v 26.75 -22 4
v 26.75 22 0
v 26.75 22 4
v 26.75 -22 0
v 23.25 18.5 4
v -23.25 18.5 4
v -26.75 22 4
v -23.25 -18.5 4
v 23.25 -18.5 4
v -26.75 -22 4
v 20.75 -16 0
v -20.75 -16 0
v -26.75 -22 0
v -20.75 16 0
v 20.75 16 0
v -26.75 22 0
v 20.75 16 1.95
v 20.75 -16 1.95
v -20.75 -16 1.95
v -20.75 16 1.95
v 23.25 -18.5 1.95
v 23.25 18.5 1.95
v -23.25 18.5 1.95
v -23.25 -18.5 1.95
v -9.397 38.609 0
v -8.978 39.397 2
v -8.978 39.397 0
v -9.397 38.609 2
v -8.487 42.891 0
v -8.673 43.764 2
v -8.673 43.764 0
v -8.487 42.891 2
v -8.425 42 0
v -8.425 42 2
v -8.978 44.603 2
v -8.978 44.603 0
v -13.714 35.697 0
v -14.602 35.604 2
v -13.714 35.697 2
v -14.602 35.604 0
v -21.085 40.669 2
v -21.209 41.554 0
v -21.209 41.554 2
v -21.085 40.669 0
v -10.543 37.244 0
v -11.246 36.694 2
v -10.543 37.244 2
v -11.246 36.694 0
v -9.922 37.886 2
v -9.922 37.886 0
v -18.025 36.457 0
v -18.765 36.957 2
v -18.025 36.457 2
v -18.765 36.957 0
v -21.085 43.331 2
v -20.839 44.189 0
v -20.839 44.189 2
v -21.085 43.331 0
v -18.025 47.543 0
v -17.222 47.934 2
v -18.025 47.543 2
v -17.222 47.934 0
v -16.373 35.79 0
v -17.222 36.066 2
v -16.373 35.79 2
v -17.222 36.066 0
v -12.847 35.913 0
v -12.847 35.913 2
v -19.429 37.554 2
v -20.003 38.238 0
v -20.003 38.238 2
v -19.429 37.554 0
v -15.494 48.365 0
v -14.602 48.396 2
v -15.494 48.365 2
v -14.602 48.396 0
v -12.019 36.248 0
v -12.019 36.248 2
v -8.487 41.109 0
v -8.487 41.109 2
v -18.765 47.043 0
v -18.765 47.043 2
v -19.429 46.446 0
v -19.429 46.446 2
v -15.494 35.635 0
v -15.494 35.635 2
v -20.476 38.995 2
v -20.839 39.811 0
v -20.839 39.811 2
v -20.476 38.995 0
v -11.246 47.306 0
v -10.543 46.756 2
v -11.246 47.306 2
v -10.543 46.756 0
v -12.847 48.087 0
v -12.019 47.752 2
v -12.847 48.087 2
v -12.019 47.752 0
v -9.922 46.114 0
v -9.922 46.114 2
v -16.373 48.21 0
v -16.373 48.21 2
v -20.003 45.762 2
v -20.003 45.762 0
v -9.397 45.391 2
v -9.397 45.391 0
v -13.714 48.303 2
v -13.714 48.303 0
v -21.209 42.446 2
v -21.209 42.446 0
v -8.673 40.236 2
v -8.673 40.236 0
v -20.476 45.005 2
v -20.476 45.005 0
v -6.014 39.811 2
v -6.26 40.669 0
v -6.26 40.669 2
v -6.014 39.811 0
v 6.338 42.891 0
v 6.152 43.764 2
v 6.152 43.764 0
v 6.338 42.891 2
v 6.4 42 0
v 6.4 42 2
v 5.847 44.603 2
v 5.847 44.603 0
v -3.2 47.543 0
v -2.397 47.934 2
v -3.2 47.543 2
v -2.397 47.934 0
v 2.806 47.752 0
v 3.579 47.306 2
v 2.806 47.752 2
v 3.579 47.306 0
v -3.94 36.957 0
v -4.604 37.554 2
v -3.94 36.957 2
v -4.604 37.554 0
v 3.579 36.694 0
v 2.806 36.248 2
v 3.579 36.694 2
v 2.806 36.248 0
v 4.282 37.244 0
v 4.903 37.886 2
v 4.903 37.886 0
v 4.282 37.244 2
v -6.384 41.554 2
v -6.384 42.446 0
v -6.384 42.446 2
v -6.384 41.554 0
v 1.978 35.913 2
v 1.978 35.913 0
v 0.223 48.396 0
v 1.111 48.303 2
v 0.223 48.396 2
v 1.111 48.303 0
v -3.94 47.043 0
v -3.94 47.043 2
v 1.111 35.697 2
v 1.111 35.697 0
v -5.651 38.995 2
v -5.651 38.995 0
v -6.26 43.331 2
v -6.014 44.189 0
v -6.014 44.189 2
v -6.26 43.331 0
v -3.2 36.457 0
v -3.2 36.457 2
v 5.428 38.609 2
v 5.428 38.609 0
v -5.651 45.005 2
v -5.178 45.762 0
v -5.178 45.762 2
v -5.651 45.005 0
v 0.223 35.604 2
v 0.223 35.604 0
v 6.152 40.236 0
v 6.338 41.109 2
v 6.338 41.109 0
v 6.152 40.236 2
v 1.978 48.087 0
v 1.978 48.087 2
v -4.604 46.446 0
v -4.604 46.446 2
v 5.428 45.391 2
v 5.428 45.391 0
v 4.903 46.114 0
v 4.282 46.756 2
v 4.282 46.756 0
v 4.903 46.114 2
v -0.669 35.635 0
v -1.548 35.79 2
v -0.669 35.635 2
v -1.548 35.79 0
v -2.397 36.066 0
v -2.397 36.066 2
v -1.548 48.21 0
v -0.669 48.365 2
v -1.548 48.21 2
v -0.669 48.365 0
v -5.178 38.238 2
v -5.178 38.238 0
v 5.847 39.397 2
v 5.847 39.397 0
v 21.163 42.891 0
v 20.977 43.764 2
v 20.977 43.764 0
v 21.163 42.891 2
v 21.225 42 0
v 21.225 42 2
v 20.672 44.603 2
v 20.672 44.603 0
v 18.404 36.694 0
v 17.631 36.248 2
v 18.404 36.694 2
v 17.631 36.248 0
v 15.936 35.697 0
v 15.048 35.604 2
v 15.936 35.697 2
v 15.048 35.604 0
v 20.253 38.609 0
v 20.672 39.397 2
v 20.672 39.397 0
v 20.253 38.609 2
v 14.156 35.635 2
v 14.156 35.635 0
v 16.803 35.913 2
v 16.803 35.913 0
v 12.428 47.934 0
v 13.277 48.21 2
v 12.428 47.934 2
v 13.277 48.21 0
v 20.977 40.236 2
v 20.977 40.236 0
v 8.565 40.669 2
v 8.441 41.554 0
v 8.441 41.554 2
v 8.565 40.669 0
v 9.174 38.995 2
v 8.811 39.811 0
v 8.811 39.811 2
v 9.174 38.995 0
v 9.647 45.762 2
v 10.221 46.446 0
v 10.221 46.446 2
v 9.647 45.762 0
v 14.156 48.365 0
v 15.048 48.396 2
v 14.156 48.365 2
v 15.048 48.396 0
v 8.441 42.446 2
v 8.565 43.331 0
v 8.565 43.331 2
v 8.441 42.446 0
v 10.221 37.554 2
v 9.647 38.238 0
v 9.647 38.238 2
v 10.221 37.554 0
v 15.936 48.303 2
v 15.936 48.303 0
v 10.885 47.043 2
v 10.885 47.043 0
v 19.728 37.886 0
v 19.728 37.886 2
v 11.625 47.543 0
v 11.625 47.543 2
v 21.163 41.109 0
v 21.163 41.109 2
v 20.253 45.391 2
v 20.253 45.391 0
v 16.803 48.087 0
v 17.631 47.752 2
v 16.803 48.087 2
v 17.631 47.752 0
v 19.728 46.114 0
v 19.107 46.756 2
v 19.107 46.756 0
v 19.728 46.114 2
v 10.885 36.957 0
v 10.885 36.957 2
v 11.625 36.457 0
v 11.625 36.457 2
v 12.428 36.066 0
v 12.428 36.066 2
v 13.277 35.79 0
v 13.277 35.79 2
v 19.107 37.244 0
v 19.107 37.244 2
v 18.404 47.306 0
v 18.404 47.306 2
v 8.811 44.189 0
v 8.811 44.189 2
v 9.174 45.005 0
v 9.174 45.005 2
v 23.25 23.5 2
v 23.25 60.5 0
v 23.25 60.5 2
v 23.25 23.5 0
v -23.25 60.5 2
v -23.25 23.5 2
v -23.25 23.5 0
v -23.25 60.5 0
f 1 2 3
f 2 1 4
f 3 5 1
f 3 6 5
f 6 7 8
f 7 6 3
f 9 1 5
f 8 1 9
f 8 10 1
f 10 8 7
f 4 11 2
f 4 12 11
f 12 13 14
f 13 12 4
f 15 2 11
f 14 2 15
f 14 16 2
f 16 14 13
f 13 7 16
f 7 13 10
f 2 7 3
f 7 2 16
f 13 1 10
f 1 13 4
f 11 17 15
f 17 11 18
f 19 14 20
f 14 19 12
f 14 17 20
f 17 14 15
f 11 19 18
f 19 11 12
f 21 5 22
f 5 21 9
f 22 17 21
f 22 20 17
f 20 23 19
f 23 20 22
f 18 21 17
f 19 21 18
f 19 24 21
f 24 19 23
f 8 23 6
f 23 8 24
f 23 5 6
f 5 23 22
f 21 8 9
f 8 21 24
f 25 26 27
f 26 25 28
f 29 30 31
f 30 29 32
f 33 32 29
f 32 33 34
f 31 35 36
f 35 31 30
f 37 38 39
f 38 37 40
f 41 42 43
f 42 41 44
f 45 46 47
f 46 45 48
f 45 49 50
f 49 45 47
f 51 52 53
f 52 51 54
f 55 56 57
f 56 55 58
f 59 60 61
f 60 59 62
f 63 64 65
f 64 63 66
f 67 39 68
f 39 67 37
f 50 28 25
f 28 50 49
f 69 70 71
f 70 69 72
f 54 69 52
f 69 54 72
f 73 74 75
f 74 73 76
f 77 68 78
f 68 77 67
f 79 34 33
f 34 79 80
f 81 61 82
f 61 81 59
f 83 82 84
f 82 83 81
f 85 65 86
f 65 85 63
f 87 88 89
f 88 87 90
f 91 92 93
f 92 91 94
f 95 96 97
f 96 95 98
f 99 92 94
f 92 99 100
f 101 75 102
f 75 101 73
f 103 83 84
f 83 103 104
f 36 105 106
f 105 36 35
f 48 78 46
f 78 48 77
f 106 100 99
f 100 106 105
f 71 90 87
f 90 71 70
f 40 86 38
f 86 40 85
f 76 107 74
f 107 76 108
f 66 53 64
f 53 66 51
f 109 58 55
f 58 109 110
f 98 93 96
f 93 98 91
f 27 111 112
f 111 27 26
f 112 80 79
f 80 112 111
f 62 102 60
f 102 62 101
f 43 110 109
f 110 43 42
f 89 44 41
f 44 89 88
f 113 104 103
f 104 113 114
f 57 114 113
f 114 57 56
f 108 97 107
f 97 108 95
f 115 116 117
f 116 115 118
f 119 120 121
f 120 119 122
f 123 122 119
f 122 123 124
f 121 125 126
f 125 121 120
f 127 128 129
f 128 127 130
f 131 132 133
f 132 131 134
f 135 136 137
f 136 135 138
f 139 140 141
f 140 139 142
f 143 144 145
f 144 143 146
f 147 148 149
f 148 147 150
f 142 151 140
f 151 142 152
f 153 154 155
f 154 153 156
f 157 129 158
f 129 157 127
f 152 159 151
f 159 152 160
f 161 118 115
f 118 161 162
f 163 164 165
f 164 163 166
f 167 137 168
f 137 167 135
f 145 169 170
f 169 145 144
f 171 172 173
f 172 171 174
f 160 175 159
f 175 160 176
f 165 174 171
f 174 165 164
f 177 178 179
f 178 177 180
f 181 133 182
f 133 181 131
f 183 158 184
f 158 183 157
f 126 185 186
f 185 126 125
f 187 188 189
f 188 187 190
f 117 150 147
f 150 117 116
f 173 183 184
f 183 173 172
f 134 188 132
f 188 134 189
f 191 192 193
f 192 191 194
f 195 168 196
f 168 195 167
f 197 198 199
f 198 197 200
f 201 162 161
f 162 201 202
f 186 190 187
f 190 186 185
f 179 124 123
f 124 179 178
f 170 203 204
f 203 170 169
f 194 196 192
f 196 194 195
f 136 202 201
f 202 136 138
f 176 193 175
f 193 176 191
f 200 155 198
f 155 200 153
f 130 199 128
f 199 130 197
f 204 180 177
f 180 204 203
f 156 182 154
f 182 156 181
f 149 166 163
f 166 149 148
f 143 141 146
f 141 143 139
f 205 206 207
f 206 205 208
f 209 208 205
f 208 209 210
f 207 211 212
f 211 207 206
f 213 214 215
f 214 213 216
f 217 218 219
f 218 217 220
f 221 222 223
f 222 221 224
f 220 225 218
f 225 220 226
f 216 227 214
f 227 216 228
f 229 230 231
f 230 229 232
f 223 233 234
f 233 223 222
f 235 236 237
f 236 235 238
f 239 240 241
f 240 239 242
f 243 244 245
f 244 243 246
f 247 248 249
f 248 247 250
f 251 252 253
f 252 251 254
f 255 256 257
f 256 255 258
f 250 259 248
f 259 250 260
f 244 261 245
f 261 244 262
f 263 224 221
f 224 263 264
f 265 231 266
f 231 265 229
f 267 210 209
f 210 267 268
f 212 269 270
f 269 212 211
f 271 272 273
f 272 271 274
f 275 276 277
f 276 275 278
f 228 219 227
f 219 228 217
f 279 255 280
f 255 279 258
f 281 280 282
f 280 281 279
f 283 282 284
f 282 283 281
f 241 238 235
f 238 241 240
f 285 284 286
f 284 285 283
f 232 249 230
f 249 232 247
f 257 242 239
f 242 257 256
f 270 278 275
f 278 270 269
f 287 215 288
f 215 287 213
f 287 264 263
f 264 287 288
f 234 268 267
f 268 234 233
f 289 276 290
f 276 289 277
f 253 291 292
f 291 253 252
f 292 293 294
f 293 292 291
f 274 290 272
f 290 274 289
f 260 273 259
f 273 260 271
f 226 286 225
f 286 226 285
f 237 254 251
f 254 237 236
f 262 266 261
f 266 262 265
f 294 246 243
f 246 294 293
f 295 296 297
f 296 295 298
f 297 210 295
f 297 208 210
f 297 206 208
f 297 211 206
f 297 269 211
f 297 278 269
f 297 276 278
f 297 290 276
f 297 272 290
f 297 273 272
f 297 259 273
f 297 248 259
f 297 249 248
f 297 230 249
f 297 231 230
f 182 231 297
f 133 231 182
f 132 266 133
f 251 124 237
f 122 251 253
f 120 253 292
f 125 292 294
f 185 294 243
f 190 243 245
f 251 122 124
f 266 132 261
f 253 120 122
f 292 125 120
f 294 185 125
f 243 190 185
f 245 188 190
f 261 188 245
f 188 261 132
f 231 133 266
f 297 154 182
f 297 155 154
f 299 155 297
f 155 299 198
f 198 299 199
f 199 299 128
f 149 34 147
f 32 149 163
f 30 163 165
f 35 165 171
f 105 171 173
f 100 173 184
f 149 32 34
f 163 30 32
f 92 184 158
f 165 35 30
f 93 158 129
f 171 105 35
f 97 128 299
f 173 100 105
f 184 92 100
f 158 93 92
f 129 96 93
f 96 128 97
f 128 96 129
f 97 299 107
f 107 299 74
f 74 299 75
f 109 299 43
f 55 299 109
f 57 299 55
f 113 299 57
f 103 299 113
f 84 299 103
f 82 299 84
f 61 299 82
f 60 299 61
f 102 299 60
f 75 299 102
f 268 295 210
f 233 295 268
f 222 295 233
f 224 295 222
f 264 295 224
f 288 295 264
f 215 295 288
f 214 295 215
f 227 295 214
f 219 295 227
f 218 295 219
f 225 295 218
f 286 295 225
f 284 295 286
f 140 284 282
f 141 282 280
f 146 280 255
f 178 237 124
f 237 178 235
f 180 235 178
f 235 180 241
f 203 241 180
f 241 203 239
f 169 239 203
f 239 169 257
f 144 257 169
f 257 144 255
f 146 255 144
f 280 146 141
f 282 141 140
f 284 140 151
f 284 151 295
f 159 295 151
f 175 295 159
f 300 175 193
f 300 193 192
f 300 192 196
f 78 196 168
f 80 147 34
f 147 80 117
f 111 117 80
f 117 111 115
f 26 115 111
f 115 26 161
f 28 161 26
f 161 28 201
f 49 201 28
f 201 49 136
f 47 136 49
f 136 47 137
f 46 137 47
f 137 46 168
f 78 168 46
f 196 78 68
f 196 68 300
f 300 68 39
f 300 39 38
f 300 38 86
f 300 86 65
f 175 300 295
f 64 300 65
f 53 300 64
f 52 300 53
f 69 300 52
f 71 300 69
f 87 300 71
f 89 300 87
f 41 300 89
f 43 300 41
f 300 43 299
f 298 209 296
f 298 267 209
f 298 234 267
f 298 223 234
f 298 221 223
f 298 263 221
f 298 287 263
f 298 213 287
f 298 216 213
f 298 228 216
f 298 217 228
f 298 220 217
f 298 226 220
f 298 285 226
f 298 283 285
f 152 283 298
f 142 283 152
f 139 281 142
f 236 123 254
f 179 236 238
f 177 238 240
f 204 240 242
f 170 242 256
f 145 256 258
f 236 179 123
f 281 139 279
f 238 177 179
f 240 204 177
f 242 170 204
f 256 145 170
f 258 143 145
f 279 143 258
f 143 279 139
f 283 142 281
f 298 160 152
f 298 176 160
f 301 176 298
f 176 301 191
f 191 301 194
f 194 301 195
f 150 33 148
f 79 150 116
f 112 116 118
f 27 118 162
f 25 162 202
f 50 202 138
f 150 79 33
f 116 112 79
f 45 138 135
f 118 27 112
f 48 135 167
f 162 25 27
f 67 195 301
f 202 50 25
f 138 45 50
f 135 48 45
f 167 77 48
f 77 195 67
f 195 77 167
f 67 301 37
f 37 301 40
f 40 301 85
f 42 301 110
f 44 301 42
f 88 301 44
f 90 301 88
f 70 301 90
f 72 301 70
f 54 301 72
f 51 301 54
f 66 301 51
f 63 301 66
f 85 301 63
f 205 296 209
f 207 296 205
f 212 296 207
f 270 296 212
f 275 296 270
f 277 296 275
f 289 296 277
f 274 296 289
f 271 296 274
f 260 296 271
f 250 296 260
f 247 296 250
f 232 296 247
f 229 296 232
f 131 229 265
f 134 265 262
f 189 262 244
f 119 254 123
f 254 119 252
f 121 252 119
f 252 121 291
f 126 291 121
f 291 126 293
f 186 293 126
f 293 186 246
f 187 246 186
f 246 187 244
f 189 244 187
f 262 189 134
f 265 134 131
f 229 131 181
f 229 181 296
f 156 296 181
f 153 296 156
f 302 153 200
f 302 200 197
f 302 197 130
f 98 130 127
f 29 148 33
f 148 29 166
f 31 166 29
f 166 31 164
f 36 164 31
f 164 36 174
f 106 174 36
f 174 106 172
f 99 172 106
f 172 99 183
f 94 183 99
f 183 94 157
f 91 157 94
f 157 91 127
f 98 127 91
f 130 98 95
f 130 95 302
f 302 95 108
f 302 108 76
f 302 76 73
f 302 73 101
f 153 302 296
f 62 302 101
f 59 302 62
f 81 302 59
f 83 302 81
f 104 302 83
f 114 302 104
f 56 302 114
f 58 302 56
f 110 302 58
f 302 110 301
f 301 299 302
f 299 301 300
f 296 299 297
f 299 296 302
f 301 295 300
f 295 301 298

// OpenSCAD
// Title: Picture Frame
// Author: http://www.thingiverse.com/Jinja
// Date: 28/9/2013

/////////// START OF PARAMETERS /////////////////

// The height of the picture
height = 45.5;

// The width of the picture
width = 36;

// The width of the frame border
border = 6;

// How much the border overlaps the edge of the picture
overlap = 2;

// How thick the frame is in total
thickness = 4;

// How thick the backing is
back_thickness = 2;

// The diameter of the magnet holes, 0 if you don't want holes. Even if you're not adding magnets, adding holes uses less plastic.
magnet_diameter = 12.8;

// whether or not to include a stand
stand = "NoStand"; //[ Stand, NoStand ]

// calibration, how many 10ths of a millimeter to adjust the backing size so it is a snug fit in the frame. Increase if it's too loose, decrease if it's too tight. Once you've found the right value for your printer you should be able to print frames of any size. Experiment with small frames first.
calibration = 0; //[-10:10]

// What to include on the plate
plate = "Both"; //[ Back, Front, Both ]


/////////// END OF PARAMETERS /////////////////
rounded = 0.7*1;
overhang=45*1;

adjust = calibration/10;

$fs=0.3*1;
//$fa=5*1; //smooth
$fa=8*1; //nearly smooth
//$fa=20*1; //rough


if( ( plate == "Front" ) || ( plate == "Both" ) )
{
	front( height, width, border, overlap, thickness, back_thickness, stand );
}

if( ( plate == "Back" ) || ( plate == "Both" ) )
{
	translate([0, width+border ,back_thickness*0.5])
	back( height+adjust+1, width+adjust+1, back_thickness, magnet_diameter);
}

module front( height, width, border, overlap, thickness, back_thickness, stand )
{
	difference()
	{
		translate([0,0,thickness*0.5])
		frame( height, width, border, overlap, thickness );
		translate([0,0,thickness-(0.5*back_thickness)])
		back( height+1, width+1, back_thickness*1.05 );
	}
	y = (height*0.7)*cos(75);
	x = y*cos(75);
	s = border-overlap-0.5;
	if( stand=="Stand" )
	{
		translate([height*0.5+s+0.5,0,thickness])
		hull()
		{
			translate([-s*0.5,0,0])
			cube([s,s,0.01], true);
			translate([-1-x,0,y])
			rotate([90,0,0])
			cylinder(s,1,1,true);
		}
	}
}


module back( height, width, back, diam )
{
	gap = 1;
	hremaining = (((height-diam)/2)-gap); 
	hnum=floor( hremaining/(diam+gap) );
	hspacing=((hremaining-((diam+gap)*hnum))/(hnum+1))+diam+gap;
	wremaining = (((width-diam)/2)-gap); 
	wnum=floor( wremaining/(diam+gap) );
	wspacing=((wremaining-((diam+gap)*wnum))/(wnum+1))+diam+gap;
	difference()
	{
		cube( [ height, width, back ], true );
		if( diam > 0 )
		{
			translate([0,0,-back])
			for(i=[-hnum:1:hnum])
			{
				for(j=[-wnum:1:wnum])
				{
					translate([i*hspacing,j*wspacing,0])
					cylinder( back*2, diam*0.5, diam*0.5 );
				}
			}
		}
	}
}

module frame( height, width, border, overlap, back )
{
	difference()
	{
		cube( [ height+2*(border-overlap), width+2*(border-overlap), back ], true );
		translate([0,0,-1])
		cube( [ height+2*(-overlap), width+2*(-overlap), back+2 ], true );
	}
}

module cutter(dist, overhang)
{
	size = dist*2;

	translate([dist,-dist,-dist])
	cube([size,size,size]);

	translate([-dist-size,-dist,-dist])
	cube([size,size,size]);

	translate([dist,-dist,0])
	rotate([0,-overhang,0])
	cube([size,size,size]);

	translate([-dist,-dist,0])
	rotate([0,-90+overhang,0])
	cube([size,size,size]);

	translate([dist,-dist,0])
	rotate([0,90+overhang,0])
	cube([size,size,size]);

	translate([-dist,-dist,0])
	rotate([0,180-overhang,0])
	cube([size,size,size]);

}

module diamond( rounded )
{
	dist = rounded;
	difference()
	{
		cube([2*rounded,2*rounded,2*rounded], true);
		for(i=[0:45:179])
		{
			rotate([0,0,i])
			cutter(dist, overhang);
		}
	}
}
